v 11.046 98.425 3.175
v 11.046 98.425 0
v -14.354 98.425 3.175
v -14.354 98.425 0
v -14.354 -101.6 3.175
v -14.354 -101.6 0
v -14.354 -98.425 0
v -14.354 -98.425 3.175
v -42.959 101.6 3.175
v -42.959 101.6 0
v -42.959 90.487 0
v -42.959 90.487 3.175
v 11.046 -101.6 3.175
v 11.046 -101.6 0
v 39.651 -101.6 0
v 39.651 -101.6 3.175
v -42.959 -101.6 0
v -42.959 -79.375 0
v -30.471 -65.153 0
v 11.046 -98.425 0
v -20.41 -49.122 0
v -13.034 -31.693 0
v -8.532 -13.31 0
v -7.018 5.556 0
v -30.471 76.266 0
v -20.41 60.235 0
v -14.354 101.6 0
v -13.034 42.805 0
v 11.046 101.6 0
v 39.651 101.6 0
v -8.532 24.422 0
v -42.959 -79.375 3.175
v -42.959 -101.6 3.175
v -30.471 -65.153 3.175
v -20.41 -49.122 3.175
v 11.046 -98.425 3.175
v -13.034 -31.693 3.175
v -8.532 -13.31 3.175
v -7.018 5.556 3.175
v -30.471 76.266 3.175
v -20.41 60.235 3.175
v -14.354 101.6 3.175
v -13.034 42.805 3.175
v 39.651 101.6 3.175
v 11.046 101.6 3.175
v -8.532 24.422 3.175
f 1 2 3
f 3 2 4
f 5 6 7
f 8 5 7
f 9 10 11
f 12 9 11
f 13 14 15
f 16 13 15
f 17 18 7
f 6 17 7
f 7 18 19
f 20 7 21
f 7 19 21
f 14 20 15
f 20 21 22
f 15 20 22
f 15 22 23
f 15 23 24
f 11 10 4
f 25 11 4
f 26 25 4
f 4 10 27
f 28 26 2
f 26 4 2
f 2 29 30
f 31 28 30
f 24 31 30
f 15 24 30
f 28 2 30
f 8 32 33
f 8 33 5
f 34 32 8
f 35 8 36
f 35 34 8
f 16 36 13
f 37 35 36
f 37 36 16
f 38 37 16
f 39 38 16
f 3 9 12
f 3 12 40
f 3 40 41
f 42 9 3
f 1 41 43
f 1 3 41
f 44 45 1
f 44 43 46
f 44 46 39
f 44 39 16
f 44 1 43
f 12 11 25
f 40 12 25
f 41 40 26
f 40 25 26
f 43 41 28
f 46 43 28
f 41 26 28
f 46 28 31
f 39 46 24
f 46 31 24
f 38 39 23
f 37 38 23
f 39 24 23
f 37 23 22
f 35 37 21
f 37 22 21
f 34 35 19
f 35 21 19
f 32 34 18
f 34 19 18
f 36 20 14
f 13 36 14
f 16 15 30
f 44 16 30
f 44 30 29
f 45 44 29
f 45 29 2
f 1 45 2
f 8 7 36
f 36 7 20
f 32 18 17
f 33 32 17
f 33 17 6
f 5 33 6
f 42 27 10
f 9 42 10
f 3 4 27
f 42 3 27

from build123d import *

# Parameters (mm, degrees)
F1_DEPTH = 3.175


with BuildPart() as f1:
    # F0 (on Top) → F1 (new body)
    with BuildSketch(Plane.XY):
        with BuildLine():
            Line((-42.959198, -79.375), (-42.959198, -101.6))
            Line((-42.959198, -101.6), (-14.659364, -101.6))
            Line((-14.659364, -101.6), (-14.353896, -101.6))
            Line((-14.353896, -101.6), (-14.353896, -98.425))
            Line((-14.353896, -98.425), (-13.463448, -98.425))
            Line((-13.463448, -98.425), (11.046104, -98.425))
            Line((11.046104, -98.425), (11.046104, -101.6))
            Line((11.046104, -101.6), (11.936552, -101.6))
            Line((11.936552, -101.6), (14.022917, -101.6))
            Line((14.022917, -101.6), (39.525854, -101.6))
            Line((39.525854, -101.6), (39.651407, -101.6))
            Line((39.651407, -101.6), (39.651407, 101.6))
            Line((39.651407, 101.6), (14.022917, 101.6))
            Line((14.022917, 101.6), (13.768917, 101.6))
            Line((13.768917, 101.6), (11.936552, 101.6))
            Line((11.936552, 101.6), (11.046104, 101.6))
            Line((11.046104, 101.6), (11.046104, 98.425))
            Line((11.046104, 98.425), (-0.763448, 98.425))
            Line((-0.763448, 98.425), (-13.463448, 98.425))
            Line((-13.463448, 98.425), (-14.353896, 98.425))
            Line((-14.353896, 98.425), (-14.353896, 101.6))
            Line((-14.353896, 101.6), (-14.913364, 101.6))
            Line((-14.913364, 101.6), (-42.959198, 101.6))
            Line((-42.959198, 101.6), (-42.959198, 90.4875))
            ThreePointArc((-42.959198, 90.4875), (-7.018182, 5.55625), (-42.959198, -79.375))
        make_face()
    extrude(amount=F1_DEPTH)


solid = f1.part
